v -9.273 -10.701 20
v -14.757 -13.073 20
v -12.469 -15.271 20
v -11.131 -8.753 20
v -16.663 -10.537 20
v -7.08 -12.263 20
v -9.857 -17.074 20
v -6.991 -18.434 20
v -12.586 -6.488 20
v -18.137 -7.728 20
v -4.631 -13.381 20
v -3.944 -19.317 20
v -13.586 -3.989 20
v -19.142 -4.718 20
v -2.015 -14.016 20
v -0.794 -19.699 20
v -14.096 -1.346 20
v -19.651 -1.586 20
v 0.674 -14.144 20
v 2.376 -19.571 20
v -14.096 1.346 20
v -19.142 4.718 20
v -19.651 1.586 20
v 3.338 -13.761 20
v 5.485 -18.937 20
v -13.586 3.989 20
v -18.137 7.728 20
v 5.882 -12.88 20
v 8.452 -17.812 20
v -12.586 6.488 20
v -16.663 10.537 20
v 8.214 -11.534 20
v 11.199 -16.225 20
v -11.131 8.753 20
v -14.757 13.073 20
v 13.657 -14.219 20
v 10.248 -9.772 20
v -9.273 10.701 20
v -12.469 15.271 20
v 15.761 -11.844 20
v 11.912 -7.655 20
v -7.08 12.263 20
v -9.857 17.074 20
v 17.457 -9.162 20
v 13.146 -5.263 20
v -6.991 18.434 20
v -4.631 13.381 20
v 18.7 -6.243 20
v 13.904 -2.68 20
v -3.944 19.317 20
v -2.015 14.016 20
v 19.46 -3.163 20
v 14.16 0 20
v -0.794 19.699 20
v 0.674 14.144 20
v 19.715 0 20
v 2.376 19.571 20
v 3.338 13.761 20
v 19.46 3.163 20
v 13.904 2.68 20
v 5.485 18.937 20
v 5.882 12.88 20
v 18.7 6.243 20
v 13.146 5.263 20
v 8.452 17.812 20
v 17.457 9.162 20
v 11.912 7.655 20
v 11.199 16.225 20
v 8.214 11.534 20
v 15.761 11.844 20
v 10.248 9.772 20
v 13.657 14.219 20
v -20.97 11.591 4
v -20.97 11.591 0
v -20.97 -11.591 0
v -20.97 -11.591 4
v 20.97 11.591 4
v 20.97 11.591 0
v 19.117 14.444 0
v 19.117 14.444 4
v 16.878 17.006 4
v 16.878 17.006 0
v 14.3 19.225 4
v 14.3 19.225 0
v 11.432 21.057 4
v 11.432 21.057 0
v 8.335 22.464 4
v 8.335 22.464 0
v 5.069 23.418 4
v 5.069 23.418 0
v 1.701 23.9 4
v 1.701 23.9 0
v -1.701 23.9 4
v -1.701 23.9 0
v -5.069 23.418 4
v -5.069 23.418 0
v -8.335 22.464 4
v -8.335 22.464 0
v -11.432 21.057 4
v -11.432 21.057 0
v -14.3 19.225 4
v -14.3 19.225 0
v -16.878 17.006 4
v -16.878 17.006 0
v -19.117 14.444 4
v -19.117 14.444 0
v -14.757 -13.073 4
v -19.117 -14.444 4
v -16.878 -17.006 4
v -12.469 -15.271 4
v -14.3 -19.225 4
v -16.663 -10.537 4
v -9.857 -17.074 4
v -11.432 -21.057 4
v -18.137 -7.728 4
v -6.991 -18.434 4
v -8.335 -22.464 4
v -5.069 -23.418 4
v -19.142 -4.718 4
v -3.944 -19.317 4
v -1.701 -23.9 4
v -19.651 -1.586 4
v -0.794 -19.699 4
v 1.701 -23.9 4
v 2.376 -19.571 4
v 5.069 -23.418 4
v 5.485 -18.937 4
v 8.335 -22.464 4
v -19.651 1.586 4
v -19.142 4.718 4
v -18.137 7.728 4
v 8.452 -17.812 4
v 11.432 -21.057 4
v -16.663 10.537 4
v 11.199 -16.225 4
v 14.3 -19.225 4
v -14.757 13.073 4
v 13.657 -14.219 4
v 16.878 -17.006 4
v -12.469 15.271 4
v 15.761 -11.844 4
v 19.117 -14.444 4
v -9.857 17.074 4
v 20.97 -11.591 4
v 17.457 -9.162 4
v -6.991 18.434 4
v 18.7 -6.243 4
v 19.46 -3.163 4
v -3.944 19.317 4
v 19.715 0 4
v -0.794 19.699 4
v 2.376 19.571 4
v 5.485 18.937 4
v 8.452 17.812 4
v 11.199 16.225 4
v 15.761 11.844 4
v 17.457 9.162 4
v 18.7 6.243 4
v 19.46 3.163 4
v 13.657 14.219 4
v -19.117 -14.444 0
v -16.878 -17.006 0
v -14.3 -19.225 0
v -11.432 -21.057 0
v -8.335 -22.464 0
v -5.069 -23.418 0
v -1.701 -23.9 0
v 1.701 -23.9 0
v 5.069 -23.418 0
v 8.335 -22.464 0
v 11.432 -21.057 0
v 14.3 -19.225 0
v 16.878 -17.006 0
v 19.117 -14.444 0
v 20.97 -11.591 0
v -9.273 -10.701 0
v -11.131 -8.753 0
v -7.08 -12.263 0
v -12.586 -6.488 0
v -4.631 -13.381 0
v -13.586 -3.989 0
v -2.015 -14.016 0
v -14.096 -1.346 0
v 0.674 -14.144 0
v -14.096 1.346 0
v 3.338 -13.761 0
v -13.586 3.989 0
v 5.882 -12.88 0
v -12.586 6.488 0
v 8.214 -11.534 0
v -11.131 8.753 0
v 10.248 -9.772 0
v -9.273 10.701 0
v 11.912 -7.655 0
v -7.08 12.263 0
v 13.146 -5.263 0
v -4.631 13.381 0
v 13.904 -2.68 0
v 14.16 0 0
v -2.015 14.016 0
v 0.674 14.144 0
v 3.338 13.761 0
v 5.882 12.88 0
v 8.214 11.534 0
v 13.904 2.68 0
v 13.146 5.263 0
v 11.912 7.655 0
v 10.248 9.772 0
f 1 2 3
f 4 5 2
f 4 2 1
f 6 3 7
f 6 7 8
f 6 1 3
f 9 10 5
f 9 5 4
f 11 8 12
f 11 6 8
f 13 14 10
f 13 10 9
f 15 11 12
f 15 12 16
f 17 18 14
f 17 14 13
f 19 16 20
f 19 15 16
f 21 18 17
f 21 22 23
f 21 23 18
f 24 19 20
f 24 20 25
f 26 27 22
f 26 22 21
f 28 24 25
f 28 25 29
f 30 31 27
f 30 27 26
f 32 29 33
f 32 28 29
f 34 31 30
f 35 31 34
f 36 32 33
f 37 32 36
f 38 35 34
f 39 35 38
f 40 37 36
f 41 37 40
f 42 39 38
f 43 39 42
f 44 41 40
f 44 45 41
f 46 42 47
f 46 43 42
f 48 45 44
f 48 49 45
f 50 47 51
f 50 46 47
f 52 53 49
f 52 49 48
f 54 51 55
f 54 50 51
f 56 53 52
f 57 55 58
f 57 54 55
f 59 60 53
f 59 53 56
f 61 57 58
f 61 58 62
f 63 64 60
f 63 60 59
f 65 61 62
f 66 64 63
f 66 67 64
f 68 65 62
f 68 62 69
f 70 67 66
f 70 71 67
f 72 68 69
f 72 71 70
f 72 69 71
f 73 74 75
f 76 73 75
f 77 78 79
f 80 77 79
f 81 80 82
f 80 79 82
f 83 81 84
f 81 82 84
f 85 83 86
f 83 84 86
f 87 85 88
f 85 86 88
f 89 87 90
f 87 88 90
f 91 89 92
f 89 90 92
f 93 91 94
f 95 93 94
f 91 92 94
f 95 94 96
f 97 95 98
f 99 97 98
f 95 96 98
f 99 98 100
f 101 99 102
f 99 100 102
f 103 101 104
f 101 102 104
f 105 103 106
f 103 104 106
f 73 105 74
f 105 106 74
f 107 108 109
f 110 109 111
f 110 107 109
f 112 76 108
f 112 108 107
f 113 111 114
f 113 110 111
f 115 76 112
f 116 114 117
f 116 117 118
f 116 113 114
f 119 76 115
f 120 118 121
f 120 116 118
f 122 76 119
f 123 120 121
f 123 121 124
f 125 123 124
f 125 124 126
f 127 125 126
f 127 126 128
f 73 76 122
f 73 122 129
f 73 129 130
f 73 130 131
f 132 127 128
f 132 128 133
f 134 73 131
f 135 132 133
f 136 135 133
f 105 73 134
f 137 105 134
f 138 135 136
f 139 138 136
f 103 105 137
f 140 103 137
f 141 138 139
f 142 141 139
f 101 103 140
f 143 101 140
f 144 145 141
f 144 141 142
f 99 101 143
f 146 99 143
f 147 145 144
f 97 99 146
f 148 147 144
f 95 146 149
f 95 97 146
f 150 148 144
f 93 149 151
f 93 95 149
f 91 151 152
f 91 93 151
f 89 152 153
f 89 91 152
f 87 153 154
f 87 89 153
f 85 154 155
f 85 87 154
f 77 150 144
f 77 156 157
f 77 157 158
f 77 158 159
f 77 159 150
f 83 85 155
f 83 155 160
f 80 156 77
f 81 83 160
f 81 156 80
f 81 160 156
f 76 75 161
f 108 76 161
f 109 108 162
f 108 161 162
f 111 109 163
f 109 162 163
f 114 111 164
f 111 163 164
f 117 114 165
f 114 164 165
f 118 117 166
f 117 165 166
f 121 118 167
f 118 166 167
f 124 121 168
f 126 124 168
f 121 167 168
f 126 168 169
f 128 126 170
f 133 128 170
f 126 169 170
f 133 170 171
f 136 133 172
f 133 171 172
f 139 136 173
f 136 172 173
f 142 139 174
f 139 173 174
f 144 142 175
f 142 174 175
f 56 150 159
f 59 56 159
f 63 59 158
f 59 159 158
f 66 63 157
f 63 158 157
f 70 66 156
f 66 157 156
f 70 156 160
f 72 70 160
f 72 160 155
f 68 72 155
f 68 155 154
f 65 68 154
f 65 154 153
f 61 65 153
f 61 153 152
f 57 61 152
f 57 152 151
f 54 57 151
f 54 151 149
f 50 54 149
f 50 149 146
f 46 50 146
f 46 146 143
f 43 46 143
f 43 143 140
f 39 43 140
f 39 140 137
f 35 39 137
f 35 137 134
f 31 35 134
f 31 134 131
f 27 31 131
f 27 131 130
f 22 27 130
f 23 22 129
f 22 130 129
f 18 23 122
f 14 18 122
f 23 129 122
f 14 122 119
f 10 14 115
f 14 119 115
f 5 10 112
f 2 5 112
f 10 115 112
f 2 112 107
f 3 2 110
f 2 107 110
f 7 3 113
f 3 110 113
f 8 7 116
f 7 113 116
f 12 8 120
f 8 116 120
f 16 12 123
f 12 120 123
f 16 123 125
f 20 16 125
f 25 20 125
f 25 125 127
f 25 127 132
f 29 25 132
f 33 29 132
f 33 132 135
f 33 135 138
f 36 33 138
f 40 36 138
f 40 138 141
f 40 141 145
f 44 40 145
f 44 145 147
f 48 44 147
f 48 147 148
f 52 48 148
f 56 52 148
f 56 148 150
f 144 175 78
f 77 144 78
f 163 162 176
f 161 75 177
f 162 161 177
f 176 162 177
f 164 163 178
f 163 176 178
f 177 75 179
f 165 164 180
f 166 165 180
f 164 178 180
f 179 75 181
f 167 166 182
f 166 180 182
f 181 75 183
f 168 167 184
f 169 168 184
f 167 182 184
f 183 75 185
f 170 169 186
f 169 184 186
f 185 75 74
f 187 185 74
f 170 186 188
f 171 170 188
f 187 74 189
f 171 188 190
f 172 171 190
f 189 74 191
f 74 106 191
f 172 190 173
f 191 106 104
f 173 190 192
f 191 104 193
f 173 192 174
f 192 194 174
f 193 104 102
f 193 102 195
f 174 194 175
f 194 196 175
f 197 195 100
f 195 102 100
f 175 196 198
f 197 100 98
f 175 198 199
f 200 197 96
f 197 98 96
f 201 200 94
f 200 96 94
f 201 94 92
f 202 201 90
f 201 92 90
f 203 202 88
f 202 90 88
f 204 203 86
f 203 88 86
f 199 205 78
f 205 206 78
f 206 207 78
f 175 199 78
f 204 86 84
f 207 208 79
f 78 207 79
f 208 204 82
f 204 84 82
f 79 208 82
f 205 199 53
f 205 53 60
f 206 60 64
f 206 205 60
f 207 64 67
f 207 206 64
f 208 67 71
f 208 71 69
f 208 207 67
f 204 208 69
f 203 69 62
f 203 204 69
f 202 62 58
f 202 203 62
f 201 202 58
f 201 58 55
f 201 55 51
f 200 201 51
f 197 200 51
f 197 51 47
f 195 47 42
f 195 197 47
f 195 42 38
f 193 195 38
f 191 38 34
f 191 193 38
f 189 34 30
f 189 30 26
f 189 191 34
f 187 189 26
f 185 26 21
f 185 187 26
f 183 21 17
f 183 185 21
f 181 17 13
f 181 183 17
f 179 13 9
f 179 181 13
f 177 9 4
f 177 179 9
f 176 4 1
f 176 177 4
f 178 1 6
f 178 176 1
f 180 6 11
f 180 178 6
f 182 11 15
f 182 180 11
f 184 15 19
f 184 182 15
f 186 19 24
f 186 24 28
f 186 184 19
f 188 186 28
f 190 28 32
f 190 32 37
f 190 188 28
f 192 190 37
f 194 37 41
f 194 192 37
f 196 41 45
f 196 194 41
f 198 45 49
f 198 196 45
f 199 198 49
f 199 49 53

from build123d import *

# Parameters (mm, degrees)
F0_R     = 19.715
F0_R_2   = 18.38
F1_DEPTH = 4
F0_R_3   = 14.16
F2_DEPTH = 20


with BuildPart() as f1:
    # F0 (on Top) → F1 (new body)
    with BuildSketch(Plane.XY):
        with BuildLine():
            Line((20.97, -11.5905435593), (20.97, 11.5905435593))
            ThreePointArc((20.97, 11.5905435593), (0, 23.96), (-20.97, 11.5905435593))
            Line((-20.97, 11.5905435593), (-20.97, -11.5905435593))
            ThreePointArc((-20.97, -11.5905435593), (0, -23.96), (20.97, -11.5905435593))
        make_face()
        Circle(F0_R, mode=Mode.SUBTRACT)
        Circle(F0_R)
        Circle(F0_R_2, mode=Mode.SUBTRACT)
    extrude(amount=F1_DEPTH)

    # F0 (on Top) → F2 (join)
    with BuildSketch(Plane.XY):
        Circle(F0_R)
        Circle(F0_R_2, mode=Mode.SUBTRACT)
        Circle(F0_R_2)
        Circle(F0_R_3, mode=Mode.SUBTRACT)
    extrude(amount=F2_DEPTH)


solid = f1.part
